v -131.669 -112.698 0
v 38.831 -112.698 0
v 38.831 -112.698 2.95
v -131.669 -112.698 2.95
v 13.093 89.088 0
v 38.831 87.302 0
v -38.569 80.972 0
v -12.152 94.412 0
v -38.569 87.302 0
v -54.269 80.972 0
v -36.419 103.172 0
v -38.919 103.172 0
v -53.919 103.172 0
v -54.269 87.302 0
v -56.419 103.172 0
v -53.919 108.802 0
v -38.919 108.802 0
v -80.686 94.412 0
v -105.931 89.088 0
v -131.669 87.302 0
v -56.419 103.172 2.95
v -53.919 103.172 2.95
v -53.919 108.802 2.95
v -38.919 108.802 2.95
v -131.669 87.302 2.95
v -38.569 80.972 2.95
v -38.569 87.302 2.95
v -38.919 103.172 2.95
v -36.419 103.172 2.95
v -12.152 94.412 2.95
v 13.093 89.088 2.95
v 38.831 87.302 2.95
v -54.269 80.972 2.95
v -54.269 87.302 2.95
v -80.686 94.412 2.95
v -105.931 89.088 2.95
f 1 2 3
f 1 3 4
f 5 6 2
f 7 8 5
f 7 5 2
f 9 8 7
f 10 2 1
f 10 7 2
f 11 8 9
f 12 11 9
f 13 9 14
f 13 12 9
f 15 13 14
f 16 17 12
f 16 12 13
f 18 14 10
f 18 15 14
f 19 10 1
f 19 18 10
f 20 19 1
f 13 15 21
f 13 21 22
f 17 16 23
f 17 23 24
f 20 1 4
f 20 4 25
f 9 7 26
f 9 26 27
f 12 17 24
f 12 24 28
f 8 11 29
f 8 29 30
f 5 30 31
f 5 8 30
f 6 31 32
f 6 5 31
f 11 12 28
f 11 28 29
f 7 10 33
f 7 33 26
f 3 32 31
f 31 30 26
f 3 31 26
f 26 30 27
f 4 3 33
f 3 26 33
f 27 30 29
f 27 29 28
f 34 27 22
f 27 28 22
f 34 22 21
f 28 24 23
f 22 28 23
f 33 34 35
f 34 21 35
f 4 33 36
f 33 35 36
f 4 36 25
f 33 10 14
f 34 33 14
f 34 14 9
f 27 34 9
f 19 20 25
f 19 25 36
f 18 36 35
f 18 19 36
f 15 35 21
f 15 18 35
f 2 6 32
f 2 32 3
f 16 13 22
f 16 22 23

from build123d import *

# Parameters (mm, degrees)
SKETCH1_W           = 15.7
SKETCH1_H           = 6.33
BOSS_EXTRUDE1_DEPTH = 2.95


with BuildPart() as part:
    # Sketch1 → Boss-Extrude1 (new body)
    with BuildSketch(Plane.XY):
        with BuildLine():
            Line((-56.418907266, 103.171587302), (-53.918907266, 103.171587302))
            Line((-53.918907266, 103.171587302), (-53.918907266, 108.801587302))
            Line((-53.918907266, 108.801587302), (-38.918907266, 108.801587302))
            Line((-38.918907266, 108.801587302), (-38.918907266, 103.171587302))
            Line((-38.918907266, 103.171587302), (-36.418907266, 103.171587302))
            ThreePointArc((-36.418907266, 103.171587302), (0.378461485, 91.312248832), (38.831092734, 87.301587302))
            Line((38.831092734, 87.301587302), (38.831092734, -112.698412698))
            Line((38.831092734, -112.698412698), (-131.668907266, -112.698412698))
            Line((-131.668907266, -112.698412698), (-131.668907266, 87.301587302))
            ThreePointArc((-131.668907266, 87.301587302), (-93.216276016, 91.312248832), (-56.418907266, 103.171587302))
        make_face()
        with Locations((-46.418907266, 84.136587302)):
            Rectangle(SKETCH1_W, SKETCH1_H, mode=Mode.SUBTRACT)
    extrude(amount=BOSS_EXTRUDE1_DEPTH)


solid = part.part
